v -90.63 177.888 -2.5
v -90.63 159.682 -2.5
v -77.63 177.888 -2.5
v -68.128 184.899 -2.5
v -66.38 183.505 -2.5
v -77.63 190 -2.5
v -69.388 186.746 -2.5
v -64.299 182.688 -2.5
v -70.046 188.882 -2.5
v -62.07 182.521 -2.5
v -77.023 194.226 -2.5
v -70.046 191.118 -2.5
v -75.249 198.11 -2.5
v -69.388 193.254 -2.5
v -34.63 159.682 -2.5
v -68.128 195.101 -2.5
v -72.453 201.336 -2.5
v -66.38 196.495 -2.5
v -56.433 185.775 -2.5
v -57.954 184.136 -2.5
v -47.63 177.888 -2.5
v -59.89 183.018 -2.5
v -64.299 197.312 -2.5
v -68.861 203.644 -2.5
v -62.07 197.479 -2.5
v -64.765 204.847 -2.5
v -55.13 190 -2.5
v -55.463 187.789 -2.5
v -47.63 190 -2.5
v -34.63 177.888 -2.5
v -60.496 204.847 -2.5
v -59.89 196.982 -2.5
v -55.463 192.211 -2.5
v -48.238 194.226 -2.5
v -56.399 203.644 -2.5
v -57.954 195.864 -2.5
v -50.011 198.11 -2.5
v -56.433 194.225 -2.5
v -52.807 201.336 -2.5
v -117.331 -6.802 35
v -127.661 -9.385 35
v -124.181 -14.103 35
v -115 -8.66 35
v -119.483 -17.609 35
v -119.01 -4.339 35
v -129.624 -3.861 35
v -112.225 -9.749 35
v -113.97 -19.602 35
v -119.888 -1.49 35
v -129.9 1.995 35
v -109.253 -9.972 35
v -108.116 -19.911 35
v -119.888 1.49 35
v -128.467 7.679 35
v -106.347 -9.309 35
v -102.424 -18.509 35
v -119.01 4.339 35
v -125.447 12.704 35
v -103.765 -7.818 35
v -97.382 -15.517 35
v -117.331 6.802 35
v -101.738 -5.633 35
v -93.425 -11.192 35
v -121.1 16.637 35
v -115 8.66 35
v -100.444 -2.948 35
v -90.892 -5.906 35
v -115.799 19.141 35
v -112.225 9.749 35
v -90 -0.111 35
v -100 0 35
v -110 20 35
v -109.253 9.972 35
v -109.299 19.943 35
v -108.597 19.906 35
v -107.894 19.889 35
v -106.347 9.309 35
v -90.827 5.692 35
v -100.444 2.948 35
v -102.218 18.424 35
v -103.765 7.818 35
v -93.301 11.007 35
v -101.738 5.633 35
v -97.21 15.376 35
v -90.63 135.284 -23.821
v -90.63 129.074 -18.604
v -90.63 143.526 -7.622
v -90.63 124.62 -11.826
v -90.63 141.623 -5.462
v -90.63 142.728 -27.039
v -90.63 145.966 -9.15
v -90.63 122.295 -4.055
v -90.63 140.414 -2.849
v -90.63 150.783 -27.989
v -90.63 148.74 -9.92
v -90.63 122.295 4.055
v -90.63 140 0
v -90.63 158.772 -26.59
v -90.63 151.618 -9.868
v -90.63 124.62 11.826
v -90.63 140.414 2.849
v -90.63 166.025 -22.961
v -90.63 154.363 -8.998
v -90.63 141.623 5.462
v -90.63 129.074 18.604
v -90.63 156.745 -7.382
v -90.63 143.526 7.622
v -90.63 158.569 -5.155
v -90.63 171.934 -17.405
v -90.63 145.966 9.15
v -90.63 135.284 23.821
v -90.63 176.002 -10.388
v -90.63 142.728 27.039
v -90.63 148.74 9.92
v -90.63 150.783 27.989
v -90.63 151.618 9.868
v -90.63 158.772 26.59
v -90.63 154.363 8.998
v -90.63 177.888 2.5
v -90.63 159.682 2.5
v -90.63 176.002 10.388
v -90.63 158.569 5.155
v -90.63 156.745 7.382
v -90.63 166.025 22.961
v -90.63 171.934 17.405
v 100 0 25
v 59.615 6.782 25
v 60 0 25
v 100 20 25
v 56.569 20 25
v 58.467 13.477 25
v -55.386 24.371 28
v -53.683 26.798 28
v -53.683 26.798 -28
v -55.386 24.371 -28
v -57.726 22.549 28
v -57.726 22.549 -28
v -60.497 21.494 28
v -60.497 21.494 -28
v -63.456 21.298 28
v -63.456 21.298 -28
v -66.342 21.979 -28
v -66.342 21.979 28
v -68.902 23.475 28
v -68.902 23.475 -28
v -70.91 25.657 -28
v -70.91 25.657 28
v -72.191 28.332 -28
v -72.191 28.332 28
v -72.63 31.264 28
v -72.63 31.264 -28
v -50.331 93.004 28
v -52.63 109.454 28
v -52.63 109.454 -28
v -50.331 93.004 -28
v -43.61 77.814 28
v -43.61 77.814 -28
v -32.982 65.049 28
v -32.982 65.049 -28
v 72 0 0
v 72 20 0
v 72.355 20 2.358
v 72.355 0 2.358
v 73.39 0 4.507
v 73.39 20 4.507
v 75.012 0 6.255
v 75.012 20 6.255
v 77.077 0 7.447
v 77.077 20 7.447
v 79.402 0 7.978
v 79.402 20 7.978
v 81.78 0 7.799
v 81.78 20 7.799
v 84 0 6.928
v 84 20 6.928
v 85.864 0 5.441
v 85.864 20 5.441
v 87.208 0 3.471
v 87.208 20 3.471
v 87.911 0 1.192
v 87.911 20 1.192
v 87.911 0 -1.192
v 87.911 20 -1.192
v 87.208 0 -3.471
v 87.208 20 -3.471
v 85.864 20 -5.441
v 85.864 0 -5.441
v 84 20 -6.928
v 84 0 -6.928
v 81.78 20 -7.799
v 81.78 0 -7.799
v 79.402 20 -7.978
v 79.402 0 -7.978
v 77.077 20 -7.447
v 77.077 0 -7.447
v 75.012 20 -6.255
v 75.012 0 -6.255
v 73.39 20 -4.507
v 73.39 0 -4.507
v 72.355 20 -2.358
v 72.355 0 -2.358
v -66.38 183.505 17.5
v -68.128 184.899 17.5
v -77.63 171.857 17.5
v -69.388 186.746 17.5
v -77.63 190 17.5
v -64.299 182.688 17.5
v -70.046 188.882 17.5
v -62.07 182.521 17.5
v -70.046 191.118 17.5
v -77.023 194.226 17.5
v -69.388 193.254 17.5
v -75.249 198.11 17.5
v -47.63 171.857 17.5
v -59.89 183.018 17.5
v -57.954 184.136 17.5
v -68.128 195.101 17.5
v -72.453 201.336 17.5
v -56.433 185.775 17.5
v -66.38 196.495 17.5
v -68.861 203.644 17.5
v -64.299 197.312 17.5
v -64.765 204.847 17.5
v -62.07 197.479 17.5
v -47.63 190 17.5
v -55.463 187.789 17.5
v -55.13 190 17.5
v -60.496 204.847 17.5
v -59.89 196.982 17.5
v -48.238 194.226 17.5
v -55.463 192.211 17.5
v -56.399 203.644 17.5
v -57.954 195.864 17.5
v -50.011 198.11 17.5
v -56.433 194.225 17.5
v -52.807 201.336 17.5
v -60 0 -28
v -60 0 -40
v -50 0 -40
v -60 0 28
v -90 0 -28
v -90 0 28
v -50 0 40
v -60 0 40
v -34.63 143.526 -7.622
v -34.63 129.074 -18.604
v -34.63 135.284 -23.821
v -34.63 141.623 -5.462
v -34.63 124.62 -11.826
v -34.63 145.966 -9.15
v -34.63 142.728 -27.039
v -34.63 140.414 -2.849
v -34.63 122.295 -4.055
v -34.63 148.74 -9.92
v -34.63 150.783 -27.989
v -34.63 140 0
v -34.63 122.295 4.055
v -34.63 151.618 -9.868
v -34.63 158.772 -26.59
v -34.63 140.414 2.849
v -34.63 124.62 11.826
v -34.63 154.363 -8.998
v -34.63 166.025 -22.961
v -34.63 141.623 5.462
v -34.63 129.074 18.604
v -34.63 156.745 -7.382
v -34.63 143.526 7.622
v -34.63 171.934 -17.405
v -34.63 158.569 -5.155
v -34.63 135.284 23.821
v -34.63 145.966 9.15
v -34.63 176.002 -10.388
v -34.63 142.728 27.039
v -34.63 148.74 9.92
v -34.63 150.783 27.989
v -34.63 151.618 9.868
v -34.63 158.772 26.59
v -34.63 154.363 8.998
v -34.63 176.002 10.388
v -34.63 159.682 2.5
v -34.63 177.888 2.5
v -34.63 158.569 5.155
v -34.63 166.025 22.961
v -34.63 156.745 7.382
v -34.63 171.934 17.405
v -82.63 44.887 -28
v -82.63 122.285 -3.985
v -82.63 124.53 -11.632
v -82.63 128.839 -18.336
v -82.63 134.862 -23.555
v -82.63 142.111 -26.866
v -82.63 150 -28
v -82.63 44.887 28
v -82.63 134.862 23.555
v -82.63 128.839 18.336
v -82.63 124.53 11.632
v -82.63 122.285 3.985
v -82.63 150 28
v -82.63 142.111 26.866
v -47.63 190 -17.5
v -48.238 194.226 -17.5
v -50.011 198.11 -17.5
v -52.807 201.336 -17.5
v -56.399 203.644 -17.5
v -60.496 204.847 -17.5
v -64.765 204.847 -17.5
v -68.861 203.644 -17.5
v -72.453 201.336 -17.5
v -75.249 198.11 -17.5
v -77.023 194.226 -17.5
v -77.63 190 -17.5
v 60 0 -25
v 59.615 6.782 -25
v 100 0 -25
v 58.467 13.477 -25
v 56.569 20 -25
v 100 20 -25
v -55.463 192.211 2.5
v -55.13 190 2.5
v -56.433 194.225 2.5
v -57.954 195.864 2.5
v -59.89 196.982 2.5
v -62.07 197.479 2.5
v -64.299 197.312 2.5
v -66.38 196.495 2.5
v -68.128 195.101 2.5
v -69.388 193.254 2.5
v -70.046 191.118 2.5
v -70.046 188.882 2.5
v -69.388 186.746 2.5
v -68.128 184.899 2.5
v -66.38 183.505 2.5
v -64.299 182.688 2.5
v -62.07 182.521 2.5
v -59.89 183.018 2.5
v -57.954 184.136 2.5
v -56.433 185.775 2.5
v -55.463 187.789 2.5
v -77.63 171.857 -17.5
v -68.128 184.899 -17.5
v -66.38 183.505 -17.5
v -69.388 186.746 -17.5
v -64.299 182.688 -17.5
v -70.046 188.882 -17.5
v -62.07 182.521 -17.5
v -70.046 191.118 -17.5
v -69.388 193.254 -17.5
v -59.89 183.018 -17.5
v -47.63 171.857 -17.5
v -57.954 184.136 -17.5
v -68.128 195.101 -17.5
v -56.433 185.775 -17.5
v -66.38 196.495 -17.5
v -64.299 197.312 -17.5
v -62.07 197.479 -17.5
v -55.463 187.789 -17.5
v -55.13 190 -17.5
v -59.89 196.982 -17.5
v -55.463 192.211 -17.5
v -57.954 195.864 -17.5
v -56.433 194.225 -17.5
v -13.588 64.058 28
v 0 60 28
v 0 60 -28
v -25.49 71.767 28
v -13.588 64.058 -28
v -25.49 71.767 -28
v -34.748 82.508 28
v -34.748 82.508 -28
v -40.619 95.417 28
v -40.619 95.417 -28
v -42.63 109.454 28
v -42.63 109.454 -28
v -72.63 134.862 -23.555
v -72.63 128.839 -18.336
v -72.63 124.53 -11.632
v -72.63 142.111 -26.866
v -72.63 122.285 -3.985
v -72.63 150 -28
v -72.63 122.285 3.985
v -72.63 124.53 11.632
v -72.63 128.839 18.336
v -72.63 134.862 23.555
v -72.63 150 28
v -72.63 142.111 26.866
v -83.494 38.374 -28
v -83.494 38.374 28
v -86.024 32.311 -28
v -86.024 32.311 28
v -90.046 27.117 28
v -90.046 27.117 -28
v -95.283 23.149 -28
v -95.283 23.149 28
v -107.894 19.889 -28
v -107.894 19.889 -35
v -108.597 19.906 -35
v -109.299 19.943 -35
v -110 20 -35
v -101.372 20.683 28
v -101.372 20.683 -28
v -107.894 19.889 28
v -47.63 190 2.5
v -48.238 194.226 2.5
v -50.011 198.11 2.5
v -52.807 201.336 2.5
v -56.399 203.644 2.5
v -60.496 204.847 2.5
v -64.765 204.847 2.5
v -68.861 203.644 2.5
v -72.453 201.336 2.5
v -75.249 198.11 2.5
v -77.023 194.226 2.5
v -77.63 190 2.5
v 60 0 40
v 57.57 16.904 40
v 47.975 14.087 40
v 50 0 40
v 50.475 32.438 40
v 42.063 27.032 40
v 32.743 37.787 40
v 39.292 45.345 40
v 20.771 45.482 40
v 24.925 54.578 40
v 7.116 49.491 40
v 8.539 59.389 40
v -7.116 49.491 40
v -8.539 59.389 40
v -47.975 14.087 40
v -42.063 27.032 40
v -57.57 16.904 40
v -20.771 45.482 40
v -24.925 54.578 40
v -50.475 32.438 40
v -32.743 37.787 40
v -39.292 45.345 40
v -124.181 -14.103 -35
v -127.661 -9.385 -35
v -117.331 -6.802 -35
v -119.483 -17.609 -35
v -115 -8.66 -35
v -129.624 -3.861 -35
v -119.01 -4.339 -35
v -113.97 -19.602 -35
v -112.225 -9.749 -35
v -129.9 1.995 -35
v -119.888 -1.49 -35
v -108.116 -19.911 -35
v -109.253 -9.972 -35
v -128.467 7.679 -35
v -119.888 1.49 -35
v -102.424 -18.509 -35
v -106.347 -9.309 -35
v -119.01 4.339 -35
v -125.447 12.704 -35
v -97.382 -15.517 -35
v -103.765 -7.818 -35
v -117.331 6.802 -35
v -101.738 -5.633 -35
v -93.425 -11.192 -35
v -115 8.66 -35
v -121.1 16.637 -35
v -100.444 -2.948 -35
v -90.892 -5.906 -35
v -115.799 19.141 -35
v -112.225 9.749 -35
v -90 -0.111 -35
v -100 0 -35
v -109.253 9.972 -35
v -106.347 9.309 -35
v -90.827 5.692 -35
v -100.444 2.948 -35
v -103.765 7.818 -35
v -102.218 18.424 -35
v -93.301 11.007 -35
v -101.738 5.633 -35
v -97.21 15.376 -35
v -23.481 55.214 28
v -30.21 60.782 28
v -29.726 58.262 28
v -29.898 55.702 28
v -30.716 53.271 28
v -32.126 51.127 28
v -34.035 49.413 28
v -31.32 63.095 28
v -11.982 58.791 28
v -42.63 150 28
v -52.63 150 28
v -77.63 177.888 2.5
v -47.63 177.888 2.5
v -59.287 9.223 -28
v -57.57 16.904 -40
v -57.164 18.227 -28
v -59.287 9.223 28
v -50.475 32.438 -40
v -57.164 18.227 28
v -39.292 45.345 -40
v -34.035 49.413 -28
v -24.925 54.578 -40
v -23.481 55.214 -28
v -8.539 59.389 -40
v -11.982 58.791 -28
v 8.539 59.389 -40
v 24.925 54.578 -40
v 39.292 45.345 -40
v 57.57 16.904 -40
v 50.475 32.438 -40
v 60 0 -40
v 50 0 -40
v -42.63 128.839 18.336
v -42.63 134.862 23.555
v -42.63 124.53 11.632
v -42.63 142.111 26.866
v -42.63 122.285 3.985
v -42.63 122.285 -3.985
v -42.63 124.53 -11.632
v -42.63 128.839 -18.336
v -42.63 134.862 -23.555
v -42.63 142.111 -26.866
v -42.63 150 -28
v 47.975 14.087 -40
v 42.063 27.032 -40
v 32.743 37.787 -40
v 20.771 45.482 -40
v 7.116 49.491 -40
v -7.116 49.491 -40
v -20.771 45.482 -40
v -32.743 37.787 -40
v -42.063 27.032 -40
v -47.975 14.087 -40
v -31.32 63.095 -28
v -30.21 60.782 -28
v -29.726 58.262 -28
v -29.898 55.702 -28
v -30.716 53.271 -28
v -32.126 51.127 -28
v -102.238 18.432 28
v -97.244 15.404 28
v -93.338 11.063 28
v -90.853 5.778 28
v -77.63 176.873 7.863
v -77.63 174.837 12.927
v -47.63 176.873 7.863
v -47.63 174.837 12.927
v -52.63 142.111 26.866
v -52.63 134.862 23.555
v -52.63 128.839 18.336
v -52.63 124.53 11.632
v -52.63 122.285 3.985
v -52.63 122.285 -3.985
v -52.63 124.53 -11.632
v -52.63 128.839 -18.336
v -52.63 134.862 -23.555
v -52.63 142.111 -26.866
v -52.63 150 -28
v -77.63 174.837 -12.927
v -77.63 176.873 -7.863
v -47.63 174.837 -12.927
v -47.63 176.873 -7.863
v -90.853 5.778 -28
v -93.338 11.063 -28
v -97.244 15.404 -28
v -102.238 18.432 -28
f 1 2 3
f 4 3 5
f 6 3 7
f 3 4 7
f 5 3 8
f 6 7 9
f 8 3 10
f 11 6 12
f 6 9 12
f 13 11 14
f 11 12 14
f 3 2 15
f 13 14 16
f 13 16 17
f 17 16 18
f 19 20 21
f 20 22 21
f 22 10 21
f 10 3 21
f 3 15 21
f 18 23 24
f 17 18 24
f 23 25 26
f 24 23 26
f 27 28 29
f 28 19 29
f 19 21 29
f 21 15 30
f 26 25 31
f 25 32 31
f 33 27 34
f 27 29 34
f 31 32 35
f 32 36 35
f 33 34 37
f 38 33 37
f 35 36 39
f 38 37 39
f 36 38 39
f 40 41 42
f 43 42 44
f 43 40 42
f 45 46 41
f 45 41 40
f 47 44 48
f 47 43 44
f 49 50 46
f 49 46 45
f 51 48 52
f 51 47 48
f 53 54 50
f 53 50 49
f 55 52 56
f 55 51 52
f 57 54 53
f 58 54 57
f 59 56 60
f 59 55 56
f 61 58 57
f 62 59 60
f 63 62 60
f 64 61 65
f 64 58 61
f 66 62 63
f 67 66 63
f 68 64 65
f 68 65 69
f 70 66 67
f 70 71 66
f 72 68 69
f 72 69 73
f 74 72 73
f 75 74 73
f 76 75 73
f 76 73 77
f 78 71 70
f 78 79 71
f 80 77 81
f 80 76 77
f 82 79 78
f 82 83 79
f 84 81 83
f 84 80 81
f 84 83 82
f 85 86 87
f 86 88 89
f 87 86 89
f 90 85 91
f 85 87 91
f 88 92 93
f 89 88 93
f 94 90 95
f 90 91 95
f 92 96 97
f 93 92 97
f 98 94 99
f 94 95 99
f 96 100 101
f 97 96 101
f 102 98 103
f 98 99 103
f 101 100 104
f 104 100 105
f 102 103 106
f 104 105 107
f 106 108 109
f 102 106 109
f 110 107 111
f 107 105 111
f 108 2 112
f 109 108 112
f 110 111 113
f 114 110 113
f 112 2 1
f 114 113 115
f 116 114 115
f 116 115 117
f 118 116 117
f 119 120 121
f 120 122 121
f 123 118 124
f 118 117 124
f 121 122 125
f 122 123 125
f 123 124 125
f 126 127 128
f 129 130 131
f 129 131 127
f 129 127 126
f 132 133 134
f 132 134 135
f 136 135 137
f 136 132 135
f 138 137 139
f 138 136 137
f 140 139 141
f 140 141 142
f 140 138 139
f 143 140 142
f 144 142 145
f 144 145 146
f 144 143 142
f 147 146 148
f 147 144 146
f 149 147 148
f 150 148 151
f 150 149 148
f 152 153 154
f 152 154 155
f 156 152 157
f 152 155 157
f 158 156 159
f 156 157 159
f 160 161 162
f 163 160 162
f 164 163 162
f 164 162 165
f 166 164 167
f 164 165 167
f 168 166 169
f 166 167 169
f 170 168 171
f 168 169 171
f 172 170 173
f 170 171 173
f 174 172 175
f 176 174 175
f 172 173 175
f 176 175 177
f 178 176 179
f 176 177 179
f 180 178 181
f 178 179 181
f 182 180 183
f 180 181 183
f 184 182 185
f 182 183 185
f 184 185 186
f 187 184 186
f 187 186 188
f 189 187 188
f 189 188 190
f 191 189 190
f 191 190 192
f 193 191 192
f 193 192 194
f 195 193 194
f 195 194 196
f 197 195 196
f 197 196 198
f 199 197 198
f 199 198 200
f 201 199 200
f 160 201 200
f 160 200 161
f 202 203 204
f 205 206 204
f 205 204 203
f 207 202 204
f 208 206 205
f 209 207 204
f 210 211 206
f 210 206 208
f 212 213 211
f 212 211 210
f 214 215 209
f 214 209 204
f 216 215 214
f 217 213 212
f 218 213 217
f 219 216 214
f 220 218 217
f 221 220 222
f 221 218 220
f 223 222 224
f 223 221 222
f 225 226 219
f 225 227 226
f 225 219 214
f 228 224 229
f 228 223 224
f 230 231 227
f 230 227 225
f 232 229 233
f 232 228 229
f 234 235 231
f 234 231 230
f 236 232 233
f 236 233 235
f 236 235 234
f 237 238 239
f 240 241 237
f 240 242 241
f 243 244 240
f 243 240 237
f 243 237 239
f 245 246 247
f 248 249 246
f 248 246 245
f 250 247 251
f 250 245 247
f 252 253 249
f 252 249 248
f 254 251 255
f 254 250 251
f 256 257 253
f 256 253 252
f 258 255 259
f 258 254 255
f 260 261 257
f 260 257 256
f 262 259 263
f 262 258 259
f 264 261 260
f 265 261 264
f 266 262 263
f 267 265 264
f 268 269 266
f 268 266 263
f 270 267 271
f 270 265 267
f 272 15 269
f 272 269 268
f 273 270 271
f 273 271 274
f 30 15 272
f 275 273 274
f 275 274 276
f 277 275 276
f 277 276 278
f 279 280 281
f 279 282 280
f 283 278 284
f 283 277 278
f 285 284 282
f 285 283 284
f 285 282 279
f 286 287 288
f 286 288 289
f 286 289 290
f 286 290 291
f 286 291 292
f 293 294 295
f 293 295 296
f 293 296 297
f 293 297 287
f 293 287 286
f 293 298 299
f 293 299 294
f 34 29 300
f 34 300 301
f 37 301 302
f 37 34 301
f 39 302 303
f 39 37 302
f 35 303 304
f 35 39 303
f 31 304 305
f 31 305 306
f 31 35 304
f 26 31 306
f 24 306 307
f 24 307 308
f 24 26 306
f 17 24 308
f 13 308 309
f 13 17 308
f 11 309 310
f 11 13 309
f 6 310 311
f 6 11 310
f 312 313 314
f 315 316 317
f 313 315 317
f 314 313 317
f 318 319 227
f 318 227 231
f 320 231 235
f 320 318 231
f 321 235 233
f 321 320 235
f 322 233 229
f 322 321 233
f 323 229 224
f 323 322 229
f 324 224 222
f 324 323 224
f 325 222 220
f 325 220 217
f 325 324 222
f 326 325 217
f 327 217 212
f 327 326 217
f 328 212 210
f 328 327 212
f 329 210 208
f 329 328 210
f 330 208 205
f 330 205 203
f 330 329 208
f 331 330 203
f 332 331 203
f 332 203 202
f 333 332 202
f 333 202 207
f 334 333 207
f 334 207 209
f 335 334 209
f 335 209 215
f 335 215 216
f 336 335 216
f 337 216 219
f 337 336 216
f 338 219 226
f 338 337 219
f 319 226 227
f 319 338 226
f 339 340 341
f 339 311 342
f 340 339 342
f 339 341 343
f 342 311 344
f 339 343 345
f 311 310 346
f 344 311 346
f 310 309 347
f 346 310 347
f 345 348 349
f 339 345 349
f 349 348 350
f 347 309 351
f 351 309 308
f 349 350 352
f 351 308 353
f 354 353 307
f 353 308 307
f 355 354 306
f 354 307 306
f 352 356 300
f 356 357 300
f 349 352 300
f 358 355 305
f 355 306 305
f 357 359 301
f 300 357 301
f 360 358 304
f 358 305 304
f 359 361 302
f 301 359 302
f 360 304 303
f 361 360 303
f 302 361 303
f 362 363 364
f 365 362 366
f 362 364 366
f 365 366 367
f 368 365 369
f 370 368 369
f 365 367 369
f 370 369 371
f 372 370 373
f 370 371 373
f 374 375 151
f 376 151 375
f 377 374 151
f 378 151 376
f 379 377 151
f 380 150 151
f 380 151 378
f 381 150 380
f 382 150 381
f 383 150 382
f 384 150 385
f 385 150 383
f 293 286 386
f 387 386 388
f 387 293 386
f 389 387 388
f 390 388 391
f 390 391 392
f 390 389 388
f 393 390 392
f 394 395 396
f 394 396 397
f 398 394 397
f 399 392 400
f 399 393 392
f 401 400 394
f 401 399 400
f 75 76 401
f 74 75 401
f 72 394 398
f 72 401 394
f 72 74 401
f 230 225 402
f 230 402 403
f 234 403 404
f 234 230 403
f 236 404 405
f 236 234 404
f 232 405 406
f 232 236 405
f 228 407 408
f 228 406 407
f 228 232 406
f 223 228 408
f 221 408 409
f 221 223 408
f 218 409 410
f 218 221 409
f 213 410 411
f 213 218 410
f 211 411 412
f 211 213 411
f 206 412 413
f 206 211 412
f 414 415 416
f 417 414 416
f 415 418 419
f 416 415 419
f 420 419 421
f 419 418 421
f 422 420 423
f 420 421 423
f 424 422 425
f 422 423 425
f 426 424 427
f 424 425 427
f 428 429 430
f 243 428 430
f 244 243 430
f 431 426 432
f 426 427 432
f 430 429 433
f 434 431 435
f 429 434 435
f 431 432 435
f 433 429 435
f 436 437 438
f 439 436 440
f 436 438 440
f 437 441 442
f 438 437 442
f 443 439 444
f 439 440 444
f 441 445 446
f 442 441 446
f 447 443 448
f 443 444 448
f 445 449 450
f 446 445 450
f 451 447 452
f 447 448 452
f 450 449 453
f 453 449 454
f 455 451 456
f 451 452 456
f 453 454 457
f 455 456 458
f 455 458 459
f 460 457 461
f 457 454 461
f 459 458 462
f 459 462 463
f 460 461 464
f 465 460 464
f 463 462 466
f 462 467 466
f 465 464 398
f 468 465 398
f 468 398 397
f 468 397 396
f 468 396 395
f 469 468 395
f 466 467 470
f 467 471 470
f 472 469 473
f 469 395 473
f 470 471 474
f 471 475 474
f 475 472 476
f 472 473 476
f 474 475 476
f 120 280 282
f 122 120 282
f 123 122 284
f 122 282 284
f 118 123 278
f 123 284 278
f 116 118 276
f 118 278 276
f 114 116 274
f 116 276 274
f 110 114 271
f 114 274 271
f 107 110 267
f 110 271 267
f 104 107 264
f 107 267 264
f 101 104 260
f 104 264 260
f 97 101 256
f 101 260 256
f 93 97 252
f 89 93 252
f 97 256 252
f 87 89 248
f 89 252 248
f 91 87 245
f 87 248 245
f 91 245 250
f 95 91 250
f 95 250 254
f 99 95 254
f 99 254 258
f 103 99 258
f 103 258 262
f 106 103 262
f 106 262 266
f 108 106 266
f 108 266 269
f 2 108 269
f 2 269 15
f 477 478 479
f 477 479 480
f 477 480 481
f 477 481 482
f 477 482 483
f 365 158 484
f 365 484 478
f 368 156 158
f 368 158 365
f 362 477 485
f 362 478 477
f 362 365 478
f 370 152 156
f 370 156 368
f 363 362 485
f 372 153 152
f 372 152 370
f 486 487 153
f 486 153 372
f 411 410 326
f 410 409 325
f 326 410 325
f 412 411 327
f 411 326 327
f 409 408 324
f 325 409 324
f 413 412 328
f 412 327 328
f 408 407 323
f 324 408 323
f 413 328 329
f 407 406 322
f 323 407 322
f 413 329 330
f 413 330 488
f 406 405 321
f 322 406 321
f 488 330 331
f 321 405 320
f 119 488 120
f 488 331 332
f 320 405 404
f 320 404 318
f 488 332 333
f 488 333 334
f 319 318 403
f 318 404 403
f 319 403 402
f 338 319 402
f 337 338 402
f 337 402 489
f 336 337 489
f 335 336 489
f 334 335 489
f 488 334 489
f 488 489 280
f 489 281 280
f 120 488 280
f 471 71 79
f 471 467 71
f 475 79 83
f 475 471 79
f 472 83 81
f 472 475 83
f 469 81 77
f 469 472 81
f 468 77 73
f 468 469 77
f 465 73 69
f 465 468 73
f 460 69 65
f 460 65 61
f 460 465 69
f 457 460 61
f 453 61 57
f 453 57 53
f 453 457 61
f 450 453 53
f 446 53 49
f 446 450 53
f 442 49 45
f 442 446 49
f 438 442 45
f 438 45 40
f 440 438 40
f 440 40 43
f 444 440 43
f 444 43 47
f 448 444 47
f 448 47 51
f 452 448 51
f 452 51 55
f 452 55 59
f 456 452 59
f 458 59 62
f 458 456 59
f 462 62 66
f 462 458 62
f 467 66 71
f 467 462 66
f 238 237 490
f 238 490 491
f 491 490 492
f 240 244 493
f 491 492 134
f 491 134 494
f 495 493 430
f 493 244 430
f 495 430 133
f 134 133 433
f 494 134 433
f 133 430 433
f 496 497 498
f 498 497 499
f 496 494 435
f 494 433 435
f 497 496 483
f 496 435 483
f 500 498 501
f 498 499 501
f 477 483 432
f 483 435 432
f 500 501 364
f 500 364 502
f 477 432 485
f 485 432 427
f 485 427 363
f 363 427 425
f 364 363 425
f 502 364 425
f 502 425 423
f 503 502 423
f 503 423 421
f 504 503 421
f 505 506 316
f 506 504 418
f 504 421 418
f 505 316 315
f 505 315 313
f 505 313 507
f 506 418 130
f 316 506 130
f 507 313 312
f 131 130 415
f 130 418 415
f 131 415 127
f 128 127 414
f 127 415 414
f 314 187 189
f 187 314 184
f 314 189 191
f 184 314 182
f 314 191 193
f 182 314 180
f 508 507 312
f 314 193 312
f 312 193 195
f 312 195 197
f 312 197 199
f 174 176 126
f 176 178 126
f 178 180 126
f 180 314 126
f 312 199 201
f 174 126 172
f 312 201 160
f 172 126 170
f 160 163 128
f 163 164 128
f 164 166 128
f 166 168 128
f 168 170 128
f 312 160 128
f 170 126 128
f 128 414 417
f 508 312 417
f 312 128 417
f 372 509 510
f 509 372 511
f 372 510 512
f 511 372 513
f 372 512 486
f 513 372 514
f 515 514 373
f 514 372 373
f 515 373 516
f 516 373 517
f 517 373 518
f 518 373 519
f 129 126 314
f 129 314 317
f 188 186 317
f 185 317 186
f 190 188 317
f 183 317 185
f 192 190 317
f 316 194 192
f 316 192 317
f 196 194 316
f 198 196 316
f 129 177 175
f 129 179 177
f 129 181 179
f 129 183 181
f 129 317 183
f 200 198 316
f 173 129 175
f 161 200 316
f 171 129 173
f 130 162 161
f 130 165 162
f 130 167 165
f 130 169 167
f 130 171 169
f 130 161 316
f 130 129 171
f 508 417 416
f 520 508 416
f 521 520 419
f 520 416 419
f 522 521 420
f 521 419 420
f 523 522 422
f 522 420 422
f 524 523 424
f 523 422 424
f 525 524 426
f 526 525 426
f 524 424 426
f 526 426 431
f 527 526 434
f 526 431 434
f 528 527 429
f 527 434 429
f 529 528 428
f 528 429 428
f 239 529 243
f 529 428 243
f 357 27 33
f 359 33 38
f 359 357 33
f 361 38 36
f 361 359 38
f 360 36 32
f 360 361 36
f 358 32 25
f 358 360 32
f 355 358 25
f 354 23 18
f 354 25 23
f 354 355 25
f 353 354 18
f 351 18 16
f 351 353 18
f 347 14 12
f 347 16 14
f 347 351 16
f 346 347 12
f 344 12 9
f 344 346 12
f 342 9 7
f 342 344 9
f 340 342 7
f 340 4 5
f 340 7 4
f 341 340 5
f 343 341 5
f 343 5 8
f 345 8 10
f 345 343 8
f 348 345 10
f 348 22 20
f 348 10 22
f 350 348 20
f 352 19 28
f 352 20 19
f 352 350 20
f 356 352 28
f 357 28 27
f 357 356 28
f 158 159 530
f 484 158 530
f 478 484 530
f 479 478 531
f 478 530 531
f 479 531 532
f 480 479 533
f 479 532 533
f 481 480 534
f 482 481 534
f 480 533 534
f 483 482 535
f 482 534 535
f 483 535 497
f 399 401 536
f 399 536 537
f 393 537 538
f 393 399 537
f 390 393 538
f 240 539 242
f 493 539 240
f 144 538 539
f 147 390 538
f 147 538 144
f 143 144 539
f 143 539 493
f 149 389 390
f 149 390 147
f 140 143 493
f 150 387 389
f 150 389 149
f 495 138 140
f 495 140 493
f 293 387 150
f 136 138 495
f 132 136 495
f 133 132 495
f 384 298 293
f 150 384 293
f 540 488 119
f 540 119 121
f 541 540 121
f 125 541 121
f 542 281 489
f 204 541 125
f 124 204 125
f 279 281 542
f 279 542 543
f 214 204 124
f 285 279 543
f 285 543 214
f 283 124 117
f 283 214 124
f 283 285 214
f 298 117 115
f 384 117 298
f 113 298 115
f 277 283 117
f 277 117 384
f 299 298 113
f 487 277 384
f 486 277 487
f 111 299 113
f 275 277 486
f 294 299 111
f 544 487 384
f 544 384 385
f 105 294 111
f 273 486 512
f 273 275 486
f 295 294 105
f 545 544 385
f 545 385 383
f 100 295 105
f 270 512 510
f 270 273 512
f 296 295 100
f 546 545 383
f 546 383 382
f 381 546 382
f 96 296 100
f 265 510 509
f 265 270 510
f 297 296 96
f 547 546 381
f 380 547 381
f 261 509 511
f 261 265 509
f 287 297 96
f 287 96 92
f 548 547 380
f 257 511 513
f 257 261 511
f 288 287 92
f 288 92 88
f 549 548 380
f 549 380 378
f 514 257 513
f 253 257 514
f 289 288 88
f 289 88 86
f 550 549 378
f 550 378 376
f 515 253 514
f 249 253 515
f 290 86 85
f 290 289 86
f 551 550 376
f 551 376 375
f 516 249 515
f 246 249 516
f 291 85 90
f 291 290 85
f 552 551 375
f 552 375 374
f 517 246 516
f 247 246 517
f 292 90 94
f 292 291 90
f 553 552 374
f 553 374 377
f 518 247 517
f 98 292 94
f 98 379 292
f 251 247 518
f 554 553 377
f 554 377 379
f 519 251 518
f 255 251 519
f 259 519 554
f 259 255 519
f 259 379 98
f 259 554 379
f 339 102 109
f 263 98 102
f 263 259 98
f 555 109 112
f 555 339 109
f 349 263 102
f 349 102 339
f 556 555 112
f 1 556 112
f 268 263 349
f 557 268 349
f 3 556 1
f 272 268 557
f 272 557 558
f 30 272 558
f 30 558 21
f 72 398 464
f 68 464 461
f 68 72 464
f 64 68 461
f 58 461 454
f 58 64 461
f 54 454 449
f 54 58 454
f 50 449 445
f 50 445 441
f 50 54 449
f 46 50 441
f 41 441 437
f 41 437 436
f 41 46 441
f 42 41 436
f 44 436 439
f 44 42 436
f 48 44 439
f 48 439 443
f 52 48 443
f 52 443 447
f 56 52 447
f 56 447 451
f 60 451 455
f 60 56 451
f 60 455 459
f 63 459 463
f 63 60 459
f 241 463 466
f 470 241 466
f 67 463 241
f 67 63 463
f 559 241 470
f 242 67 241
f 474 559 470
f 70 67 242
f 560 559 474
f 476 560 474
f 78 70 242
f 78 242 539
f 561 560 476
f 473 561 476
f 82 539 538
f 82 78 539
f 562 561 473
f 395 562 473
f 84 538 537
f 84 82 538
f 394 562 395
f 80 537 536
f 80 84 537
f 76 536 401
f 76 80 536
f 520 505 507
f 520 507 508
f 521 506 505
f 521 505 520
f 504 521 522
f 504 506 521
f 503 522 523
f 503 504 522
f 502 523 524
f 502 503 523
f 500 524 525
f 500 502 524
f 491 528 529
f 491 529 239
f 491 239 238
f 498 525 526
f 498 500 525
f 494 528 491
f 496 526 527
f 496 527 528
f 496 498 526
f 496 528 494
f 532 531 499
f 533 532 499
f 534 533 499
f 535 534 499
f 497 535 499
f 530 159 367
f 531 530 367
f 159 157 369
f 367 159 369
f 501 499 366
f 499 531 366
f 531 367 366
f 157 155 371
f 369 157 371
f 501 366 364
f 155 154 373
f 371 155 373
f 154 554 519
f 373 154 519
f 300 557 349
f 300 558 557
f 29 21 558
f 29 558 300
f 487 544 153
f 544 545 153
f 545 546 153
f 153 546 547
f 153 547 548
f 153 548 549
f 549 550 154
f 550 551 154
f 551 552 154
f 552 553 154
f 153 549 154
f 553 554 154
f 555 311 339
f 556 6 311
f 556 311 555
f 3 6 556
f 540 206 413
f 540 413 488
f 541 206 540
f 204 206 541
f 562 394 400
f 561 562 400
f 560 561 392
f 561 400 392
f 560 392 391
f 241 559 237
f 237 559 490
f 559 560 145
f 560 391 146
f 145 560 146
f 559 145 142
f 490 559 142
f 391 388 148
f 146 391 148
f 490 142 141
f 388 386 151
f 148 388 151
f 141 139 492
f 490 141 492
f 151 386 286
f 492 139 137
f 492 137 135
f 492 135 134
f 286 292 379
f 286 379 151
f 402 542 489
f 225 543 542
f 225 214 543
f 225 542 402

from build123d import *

# Parameters (mm, degrees)
BOSS_EXTRUDE1_DEPTH = 40
SKETCH1_3_R         = 9.999999999999993
BOSS_EXTRUDE2_DEPTH = 35
BOSS_EXTRUDE3_DEPTH = 28
BOSS_EXTRUDE4_DEPTH = 25
SKETCH3_R           = 8.000000000000012
CUT_EXTRUDE1_DEPTH  = 67
SKETCH8_R           = 27.999999999999996
BOSS_EXTRUDE5_DEPTH = 28
SKETCH9_R           = 7.500000000000014
BOSS_EXTRUDE6_DEPTH = 17.5
SKETCH10_R          = 10.000000000000004
CUT_EXTRUDE3_DEPTH  = 60
SKETCH10_4_R        = 10.000000000000004
CUT_EXTRUDE4_DEPTH  = 60


with BuildPart() as part:
    # Sketch1 → Boss-Extrude1 (new, symmetric)
    with BuildSketch(Plane.XY):
        with BuildLine():
            ThreePointArc((50, 0), (3.06e-15, 50), (-50, 0))
            Line((-50, 0), (-60, 0))
            ThreePointArc((-60, 0), (3.67e-15, 60), (60, 0))
            Line((60, 0), (50, 0))
        make_face()
    extrude(amount=BOSS_EXTRUDE1_DEPTH, both=True)



with BuildPart() as body_2:
    # Sketch1<3> → Boss-Extrude2 (new, symmetric)
    with BuildSketch(Plane.XY):
        with BuildLine():
            ThreePointArc((-110, 19.999999999999986), (-124.14213562373095, -14.142135623730939), (-90.00000000000001, -4.9e-15))
            ThreePointArc((-90.00000000000001, 0), (-95.13196534092553, 13.376903430037897), (-107.894154537656, 19.88882638288958))
            ThreePointArc((-107.894154537656, 19.888826382889572), (-108.94824999295787, 19.92219950575522), (-110, 20))
        make_face()
        with Locations((-110, 0)):
            Circle(SKETCH1_3_R, mode=Mode.SUBTRACT)
    extrude(amount=BOSS_EXTRUDE2_DEPTH, both=True)


with BuildPart() as part_1:
    add(part.part)

    add(body_2.part)  # Boss-Extrude3 merges body 2
    # Sketch1<6> → Boss-Extrude3 (add, symmetric)
    with BuildSketch(Plane.XY):
        with BuildLine():
            ThreePointArc((-32.98168393227754, 65.04935068656462), (-29.729511757993123, 56.976796834196755), (-34.03450339822838, 49.413081045771484))
            ThreePointArc((-34.034503398228374, 49.413081045771484), (-17.821547874044366, 57.29216727767544), (-1.66e-15, 59.99999999999999))
            ThreePointArc((-1.78e-15, 59.99999999999999), (-30.50166992482464, 76.80795981518852), (-42.63026373834409, 109.45388748555197))
            Line((-42.630263738344084, 109.45388748555196), (-42.63026373834409, 150))
            Line((-42.63026373834409, 150), (-52.63026373834409, 150))
            Line((-52.63026373834409, 150), (-52.63026373834409, 139.99999999999997))
            Line((-52.63026373834409, 139.99999999999997), (-52.630263738344084, 109.45388748555197))
            ThreePointArc((-52.63026373834408, 109.45388748555197), (-47.498675468756, 85.17514381579021), (-32.981683932277534, 65.04935068656462))
        make_face()
        with BuildLine():
            Line((-90, -3.21e-15), (-60, 0))
            ThreePointArc((-60, -3.31e-15), (-58.39942205303789, 13.766172448111766), (-53.68308320429493, 26.797883828406057))
            ThreePointArc((-53.683083204294945, 26.79788382840606), (-64.92462581302938, 21.530960790967427), (-72.63026373834407, 31.26419779980706))
            Line((-72.63026373834407, 31.264197799807064), (-72.6302637383441, 139.99999999999997))
            Line((-72.6302637383441, 139.99999999999997), (-72.6302637383441, 150))
            Line((-72.6302637383441, 150), (-82.63026373834408, 150))
            Line((-82.63026373834408, 150), (-82.63026373834408, 44.88743357701219))
            ThreePointArc((-82.63026373834407, 44.88743357701218), (-90.04614121236624, 27.116709478332382), (-107.894154537656, 19.888826382889572))
            ThreePointArc((-107.894154537656, 19.88882638288958), (-95.13196534092553, 13.376903430037897), (-90.00000000000001, 0))
        make_face()
    extrude(amount=BOSS_EXTRUDE3_DEPTH, both=True)

    # Sketch1<7> → Boss-Extrude4 (add, symmetric)
    with BuildSketch(Plane.XY):
        with BuildLine():
            ThreePointArc((56.568542494923804, 19.999999999999993), (59.13591357920932, 10.146118723545761), (60, 0))
            Line((60, 0), (100, 0))
            Line((100, 0), (100, 20))
            Line((100, 20), (56.568542494923804, 19.999999999999993))
        make_face()
    extrude(amount=BOSS_EXTRUDE4_DEPTH, both=True)

    # Sketch3 → Cut-Extrude1 (cut)
    with BuildSketch(Plane(origin=(-3.2e-15, 19.999999999999982, 0), x_dir=(1, 1.6e-16, 0), z_dir=(-1.6e-16, 1, 0))):
        with Locations(Location((80, 0, 0), (0, 0, 180))):
            Circle(SKETCH3_R)
    extrude(amount=-CUT_EXTRUDE1_DEPTH, mode=Mode.SUBTRACT)

    # Sketch8 → Boss-Extrude5 (add, symmetric)
    with BuildSketch(Plane(origin=(-62.630263738344055, -1.072e-14, 0), x_dir=(0, 0, -1), z_dir=(1, 1.7e-16, 0))):
        with Locations(Location((0, 150, 0), (0, 0, 90))):
            Circle(SKETCH8_R)
    extrude(amount=BOSS_EXTRUDE5_DEPTH, both=True)

    # Sketch9 → Boss-Extrude6 (add, symmetric)
    with BuildSketch(Plane.XY):
        with BuildLine():
            Line((-77.63026373834407, 190), (-77.63026373834407, 170))
            Line((-77.63026373834407, 170), (-47.63026373834407, 170))
            Line((-47.63026373834407, 170), (-47.63026373834407, 190))
            ThreePointArc((-47.63026373834407, 190), (-62.63026373834407, 205), (-77.63026373834407, 190))
        make_face()
        with Locations((-62.63026373834407, 190)):
            Circle(SKETCH9_R, mode=Mode.SUBTRACT)
    extrude(amount=BOSS_EXTRUDE6_DEPTH, both=True)

    # Sketch10 → Cut-Extrude3 (cut)
    with BuildSketch(Plane(origin=(-34.630263738344055, -5.93e-15, 0), x_dir=(0, 0, -1), z_dir=(1, 1.7e-16, 0))):
        with Locations(Location((0, 150, 0), (0, 0, 90))):
            Circle(SKETCH10_R)
    extrude(amount=-CUT_EXTRUDE3_DEPTH, mode=Mode.SUBTRACT)

    # Sketch10<4> → Cut-Extrude4 (cut)
    with BuildSketch(Plane(origin=(-34.630263738344055, -5.93e-15, 0), x_dir=(0, 0, -1), z_dir=(1, 1.7e-16, 0))):
        with Locations((0, 150)):
            Circle(SKETCH10_4_R)
        Polygon((-2.5, 150), (2.5, 150), (2.5000000000000004, 205.00000000000003), (-2.5, 205.00000000000003), align=None)
    extrude(amount=-CUT_EXTRUDE4_DEPTH, mode=Mode.SUBTRACT)


solid = part_1.part
